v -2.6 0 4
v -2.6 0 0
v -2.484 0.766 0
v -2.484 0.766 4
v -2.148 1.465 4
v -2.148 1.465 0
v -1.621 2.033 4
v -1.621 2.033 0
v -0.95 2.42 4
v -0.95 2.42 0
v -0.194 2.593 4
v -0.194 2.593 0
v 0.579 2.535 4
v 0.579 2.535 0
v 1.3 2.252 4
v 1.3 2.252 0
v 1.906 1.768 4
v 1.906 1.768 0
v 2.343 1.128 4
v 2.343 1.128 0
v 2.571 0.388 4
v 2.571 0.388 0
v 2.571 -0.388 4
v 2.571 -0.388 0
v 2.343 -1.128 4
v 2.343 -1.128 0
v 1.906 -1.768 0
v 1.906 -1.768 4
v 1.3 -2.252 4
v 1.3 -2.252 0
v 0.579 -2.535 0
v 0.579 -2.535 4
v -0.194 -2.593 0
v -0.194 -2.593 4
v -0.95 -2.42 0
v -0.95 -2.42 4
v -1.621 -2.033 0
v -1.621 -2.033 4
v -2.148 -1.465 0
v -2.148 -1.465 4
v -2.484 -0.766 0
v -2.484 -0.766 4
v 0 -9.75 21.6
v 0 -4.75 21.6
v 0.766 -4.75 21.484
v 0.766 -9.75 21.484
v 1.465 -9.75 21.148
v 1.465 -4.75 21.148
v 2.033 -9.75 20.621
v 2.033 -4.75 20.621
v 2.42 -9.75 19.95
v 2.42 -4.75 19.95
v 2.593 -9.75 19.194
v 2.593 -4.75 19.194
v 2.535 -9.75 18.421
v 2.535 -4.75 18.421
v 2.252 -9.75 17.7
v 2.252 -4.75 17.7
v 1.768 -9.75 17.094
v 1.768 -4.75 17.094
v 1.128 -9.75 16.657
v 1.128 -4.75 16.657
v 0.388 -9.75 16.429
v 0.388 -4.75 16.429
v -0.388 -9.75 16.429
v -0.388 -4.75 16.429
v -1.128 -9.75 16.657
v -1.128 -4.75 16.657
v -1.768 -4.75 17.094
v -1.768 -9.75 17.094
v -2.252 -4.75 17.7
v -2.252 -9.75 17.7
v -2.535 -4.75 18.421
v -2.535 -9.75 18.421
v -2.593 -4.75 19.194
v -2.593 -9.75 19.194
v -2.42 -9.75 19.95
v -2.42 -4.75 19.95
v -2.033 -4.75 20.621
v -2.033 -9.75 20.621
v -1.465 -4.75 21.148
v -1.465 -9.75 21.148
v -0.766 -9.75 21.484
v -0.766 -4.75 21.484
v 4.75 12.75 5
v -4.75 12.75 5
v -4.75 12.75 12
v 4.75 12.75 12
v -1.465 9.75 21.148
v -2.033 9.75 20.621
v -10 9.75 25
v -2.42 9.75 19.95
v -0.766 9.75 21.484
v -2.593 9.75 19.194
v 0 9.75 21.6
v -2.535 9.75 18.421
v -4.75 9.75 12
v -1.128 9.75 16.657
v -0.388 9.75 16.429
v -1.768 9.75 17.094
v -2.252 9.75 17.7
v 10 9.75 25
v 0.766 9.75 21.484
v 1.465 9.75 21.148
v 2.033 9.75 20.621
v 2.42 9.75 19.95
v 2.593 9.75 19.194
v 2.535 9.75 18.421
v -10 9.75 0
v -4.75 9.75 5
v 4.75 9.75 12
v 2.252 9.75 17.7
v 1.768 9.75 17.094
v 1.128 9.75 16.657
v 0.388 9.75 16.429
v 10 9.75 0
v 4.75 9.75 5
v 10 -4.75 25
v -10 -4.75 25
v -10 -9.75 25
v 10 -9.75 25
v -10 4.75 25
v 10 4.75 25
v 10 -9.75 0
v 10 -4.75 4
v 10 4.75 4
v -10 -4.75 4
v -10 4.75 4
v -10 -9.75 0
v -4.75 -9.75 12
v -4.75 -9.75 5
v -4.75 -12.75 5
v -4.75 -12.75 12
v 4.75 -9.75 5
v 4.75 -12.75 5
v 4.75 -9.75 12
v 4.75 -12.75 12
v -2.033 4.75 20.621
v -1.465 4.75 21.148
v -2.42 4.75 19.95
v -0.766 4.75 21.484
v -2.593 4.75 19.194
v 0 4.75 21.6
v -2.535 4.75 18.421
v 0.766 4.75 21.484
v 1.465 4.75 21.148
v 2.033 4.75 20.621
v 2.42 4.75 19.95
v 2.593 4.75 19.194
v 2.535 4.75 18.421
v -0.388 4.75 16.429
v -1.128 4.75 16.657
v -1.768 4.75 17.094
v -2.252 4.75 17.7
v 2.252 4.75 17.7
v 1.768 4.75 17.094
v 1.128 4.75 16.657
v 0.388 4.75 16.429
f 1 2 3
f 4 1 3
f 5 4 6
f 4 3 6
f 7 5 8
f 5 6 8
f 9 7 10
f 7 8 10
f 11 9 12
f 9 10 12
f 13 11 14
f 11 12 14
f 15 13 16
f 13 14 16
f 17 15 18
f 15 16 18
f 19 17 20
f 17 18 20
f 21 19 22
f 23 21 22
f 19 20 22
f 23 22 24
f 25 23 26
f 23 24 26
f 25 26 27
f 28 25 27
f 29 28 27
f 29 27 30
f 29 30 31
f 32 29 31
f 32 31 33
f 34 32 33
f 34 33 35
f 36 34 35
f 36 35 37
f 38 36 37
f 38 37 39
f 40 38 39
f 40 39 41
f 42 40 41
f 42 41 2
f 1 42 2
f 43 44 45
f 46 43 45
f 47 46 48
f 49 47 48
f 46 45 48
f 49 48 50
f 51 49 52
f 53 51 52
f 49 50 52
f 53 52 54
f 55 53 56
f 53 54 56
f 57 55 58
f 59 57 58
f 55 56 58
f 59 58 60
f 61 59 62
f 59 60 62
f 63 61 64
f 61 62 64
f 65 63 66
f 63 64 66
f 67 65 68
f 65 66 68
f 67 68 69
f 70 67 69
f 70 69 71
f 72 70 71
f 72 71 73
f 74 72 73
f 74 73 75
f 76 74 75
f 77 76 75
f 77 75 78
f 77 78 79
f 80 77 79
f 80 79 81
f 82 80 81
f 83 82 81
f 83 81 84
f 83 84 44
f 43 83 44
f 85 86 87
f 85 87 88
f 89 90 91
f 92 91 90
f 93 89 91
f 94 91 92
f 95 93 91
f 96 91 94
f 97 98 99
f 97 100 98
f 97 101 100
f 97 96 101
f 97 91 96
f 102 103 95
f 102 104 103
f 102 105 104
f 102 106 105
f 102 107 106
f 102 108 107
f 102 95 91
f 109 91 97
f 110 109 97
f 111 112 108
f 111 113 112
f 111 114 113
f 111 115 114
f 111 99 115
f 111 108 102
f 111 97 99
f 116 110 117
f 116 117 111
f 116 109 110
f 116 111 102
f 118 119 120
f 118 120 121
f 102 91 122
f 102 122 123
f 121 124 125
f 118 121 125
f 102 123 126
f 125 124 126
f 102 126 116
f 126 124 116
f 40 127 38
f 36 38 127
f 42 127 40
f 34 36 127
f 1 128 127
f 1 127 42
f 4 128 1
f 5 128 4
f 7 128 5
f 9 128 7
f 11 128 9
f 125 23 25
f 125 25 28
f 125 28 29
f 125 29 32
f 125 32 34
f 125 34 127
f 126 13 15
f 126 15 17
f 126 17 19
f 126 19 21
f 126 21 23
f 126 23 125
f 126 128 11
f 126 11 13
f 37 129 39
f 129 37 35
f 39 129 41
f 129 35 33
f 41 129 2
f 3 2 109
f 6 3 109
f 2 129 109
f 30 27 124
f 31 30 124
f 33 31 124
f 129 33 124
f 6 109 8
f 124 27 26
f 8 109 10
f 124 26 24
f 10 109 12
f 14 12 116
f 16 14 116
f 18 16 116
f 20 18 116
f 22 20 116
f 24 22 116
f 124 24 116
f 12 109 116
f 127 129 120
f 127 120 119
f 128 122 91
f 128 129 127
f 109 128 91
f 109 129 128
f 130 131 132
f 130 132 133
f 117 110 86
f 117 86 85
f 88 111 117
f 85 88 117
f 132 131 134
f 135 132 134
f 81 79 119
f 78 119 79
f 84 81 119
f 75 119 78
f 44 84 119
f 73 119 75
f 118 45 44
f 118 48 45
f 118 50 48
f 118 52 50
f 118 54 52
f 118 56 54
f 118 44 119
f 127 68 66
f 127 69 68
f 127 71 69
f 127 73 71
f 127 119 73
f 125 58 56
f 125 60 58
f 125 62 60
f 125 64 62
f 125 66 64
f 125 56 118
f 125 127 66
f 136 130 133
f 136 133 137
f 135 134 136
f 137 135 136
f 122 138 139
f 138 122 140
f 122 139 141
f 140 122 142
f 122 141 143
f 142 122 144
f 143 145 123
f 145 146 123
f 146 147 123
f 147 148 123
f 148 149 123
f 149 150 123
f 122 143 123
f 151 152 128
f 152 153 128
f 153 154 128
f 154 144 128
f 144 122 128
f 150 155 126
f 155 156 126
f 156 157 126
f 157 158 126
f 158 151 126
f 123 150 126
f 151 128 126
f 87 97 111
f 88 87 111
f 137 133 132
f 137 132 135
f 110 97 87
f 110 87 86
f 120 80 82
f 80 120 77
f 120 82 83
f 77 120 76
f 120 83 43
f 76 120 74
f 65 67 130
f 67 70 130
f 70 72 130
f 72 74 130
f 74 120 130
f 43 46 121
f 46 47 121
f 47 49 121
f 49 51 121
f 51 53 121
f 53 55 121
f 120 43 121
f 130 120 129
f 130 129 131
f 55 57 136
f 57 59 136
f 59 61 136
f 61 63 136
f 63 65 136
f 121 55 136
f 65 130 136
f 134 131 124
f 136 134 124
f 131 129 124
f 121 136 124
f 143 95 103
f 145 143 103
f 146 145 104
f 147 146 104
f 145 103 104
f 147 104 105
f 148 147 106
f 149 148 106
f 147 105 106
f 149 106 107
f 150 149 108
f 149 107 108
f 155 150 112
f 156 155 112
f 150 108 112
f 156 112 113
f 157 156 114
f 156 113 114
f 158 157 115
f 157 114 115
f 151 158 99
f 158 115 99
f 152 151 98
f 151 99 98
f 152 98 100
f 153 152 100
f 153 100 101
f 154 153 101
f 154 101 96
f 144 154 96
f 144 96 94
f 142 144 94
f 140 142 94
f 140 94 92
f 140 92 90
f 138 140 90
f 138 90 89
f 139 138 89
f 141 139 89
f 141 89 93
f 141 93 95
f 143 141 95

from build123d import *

# Parameters (mm, degrees)
SKETCH_1_W          = 20
SKETCH_1_H          = 19.5
EXTRUDE_1_DEPTH     = 4
SKETCH_2_W          = 20
SKETCH_2_H          = 5
EXTRUDE_2_DEPTH     = 21
SKETCH_3_W          = 9.5
SKETCH_3_H          = 7
EXTRUDE_3_DEPTH     = 3
SKETCH_4_W          = 9.5
SKETCH_4_H          = 7
EXTRUDE_4_DEPTH     = 3
SKETCH_5_R          = 2.6
CUT_EXTRUDE_1_DEPTH = 36.089172119
SKETCH_6_R          = 2.6
CUT_EXTRUDE_2_DEPTH = 30.791987178


with BuildPart() as part:
    # 草图1 → 凸台-拉伸1 (new body)
    with BuildSketch(Plane.XY):
        Rectangle(SKETCH_1_W, SKETCH_1_H)
    extrude(amount=EXTRUDE_1_DEPTH)

    # 草图2 → 凸台-拉伸2 (add)
    with BuildSketch(Plane.XY.offset(4)):
        with Locations((0, 7.25)):
            Rectangle(SKETCH_2_W, SKETCH_2_H)
        with Locations((0, -7.25)):
            Rectangle(SKETCH_2_W, SKETCH_2_H)
    extrude(amount=EXTRUDE_2_DEPTH)

    # 草图3 → 凸台-拉伸3 (add)
    with BuildSketch(Plane(origin=(0, 9.75, 0), x_dir=(1, 0, 0), z_dir=(0, 1, 0))):
        with Locations((0, -8.5)):
            Rectangle(SKETCH_3_W, SKETCH_3_H)
    extrude(amount=EXTRUDE_3_DEPTH)

    # 草图4 → 凸台-拉伸4 (add)
    with BuildSketch(Plane.XZ.offset(9.75)):
        with Locations((0, 8.5)):
            Rectangle(SKETCH_4_W, SKETCH_4_H)
    extrude(amount=EXTRUDE_4_DEPTH)

    # 草图5 → 切除-拉伸1 (cut, through all)
    with BuildSketch(Plane(origin=(0, 9.75, 0), x_dir=(1, 0, 0), z_dir=(0, 1, 0))):
        with Locations(Location((0, -19, 0), (0, 0, 270))):
            Circle(SKETCH_5_R)
    extrude(amount=-CUT_EXTRUDE_1_DEPTH, mode=Mode.SUBTRACT)

    # 草图6 → 切除-拉伸2 (cut, through all)
    with BuildSketch(Plane(origin=(0, 0, 0), x_dir=(-1, 0, 0), z_dir=(0, 0, -1))):
        Circle(SKETCH_6_R)
    extrude(amount=-CUT_EXTRUDE_2_DEPTH, mode=Mode.SUBTRACT)


solid = part.part
